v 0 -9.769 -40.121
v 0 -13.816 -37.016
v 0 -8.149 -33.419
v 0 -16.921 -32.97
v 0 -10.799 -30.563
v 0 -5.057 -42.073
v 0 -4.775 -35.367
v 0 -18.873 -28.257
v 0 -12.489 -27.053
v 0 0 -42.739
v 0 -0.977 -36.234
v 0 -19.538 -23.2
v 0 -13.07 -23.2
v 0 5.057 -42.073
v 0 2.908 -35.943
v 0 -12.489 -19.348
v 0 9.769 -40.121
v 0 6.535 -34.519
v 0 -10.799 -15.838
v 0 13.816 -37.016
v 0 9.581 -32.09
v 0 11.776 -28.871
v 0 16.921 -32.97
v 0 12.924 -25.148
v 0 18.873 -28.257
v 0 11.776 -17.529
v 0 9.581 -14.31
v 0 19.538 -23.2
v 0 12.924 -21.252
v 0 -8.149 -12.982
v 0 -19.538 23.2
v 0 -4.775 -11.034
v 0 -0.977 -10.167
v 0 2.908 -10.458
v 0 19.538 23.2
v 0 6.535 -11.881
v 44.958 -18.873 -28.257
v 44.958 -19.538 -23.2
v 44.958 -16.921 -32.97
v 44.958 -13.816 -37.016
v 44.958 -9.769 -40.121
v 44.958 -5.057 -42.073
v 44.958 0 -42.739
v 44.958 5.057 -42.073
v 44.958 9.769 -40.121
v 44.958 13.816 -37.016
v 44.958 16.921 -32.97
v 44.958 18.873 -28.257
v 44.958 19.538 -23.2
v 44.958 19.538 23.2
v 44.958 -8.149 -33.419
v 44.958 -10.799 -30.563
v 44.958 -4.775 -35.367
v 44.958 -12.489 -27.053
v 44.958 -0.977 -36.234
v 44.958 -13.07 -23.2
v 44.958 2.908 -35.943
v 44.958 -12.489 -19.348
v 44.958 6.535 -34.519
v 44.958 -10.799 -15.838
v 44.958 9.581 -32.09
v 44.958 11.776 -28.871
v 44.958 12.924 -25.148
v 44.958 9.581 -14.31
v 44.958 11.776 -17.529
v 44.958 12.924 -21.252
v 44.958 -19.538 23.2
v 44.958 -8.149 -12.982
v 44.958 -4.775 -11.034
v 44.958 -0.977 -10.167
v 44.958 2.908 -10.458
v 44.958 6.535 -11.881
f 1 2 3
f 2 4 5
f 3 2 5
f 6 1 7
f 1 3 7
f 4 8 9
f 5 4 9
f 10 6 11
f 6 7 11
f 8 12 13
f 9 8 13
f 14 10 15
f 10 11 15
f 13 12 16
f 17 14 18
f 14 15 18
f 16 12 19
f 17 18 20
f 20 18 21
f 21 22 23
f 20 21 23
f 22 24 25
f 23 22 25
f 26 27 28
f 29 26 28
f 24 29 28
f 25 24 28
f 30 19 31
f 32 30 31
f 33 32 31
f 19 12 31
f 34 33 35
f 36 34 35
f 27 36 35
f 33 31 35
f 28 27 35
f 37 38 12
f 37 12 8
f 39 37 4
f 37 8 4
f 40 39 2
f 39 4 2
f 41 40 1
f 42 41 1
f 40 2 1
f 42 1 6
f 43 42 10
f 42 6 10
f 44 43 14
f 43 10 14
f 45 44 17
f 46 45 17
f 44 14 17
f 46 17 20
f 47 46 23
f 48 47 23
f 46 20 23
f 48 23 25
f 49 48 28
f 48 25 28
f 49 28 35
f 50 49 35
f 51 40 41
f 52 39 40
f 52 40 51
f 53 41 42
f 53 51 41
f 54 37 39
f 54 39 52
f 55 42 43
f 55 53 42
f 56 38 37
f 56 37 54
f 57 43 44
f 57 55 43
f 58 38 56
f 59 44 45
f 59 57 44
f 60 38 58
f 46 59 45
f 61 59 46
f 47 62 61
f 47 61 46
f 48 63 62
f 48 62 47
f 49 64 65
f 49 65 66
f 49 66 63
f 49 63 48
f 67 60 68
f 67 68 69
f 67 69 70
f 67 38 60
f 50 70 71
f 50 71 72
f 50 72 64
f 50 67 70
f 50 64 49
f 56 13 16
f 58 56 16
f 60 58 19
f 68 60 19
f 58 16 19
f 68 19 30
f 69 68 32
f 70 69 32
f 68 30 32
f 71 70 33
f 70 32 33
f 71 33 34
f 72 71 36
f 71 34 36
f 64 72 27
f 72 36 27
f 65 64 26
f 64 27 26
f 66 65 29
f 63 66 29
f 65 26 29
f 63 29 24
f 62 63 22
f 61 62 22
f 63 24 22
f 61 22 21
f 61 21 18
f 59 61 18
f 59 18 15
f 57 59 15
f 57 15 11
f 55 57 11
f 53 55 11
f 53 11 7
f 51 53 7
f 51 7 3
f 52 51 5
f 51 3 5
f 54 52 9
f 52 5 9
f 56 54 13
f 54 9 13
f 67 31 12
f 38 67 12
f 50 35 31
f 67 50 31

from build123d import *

# Parameters (mm, degrees)
F1_DEPTH = 44.958


with BuildPart() as f1:
    # F0 (on Right) → F1 (new body)
    with BuildSketch(Plane.YZ):
        with BuildLine():
            Line((19.538479, -23.200311), (13.070115, -23.200311))
            ThreePointArc((13.070115, -23.200311), (0, -36.270426), (-13.070115, -23.200311))
            Line((-13.070115, -23.200311), (-19.538479, -23.200311))
            ThreePointArc((-19.538479, -23.200311), (0, -42.73879), (19.538479, -23.200311))
        make_face()
        with BuildLine():
            ThreePointArc((-13.070115, -23.200311), (0, -10.130196), (13.070115, -23.200311))
            Line((13.070115, -23.200311), (19.538479, -23.200311))
            ThreePointArc((19.538479, -23.200311), (0, -3.661832), (-19.538479, -23.200311))
            Line((-19.538479, -23.200311), (-13.070115, -23.200311))
        make_face()
        with BuildLine():
            ThreePointArc((-19.538479, -23.200311), (0, -3.661832), (19.538479, -23.200311))
            Line((19.538479, -23.200311), (19.538479, 23.200311))
            Line((19.538479, 23.200311), (-19.538479, 23.200311))
            Line((-19.538479, 23.200311), (-19.538479, -23.200311))
        make_face()
    extrude(amount=F1_DEPTH)


solid = f1.part
